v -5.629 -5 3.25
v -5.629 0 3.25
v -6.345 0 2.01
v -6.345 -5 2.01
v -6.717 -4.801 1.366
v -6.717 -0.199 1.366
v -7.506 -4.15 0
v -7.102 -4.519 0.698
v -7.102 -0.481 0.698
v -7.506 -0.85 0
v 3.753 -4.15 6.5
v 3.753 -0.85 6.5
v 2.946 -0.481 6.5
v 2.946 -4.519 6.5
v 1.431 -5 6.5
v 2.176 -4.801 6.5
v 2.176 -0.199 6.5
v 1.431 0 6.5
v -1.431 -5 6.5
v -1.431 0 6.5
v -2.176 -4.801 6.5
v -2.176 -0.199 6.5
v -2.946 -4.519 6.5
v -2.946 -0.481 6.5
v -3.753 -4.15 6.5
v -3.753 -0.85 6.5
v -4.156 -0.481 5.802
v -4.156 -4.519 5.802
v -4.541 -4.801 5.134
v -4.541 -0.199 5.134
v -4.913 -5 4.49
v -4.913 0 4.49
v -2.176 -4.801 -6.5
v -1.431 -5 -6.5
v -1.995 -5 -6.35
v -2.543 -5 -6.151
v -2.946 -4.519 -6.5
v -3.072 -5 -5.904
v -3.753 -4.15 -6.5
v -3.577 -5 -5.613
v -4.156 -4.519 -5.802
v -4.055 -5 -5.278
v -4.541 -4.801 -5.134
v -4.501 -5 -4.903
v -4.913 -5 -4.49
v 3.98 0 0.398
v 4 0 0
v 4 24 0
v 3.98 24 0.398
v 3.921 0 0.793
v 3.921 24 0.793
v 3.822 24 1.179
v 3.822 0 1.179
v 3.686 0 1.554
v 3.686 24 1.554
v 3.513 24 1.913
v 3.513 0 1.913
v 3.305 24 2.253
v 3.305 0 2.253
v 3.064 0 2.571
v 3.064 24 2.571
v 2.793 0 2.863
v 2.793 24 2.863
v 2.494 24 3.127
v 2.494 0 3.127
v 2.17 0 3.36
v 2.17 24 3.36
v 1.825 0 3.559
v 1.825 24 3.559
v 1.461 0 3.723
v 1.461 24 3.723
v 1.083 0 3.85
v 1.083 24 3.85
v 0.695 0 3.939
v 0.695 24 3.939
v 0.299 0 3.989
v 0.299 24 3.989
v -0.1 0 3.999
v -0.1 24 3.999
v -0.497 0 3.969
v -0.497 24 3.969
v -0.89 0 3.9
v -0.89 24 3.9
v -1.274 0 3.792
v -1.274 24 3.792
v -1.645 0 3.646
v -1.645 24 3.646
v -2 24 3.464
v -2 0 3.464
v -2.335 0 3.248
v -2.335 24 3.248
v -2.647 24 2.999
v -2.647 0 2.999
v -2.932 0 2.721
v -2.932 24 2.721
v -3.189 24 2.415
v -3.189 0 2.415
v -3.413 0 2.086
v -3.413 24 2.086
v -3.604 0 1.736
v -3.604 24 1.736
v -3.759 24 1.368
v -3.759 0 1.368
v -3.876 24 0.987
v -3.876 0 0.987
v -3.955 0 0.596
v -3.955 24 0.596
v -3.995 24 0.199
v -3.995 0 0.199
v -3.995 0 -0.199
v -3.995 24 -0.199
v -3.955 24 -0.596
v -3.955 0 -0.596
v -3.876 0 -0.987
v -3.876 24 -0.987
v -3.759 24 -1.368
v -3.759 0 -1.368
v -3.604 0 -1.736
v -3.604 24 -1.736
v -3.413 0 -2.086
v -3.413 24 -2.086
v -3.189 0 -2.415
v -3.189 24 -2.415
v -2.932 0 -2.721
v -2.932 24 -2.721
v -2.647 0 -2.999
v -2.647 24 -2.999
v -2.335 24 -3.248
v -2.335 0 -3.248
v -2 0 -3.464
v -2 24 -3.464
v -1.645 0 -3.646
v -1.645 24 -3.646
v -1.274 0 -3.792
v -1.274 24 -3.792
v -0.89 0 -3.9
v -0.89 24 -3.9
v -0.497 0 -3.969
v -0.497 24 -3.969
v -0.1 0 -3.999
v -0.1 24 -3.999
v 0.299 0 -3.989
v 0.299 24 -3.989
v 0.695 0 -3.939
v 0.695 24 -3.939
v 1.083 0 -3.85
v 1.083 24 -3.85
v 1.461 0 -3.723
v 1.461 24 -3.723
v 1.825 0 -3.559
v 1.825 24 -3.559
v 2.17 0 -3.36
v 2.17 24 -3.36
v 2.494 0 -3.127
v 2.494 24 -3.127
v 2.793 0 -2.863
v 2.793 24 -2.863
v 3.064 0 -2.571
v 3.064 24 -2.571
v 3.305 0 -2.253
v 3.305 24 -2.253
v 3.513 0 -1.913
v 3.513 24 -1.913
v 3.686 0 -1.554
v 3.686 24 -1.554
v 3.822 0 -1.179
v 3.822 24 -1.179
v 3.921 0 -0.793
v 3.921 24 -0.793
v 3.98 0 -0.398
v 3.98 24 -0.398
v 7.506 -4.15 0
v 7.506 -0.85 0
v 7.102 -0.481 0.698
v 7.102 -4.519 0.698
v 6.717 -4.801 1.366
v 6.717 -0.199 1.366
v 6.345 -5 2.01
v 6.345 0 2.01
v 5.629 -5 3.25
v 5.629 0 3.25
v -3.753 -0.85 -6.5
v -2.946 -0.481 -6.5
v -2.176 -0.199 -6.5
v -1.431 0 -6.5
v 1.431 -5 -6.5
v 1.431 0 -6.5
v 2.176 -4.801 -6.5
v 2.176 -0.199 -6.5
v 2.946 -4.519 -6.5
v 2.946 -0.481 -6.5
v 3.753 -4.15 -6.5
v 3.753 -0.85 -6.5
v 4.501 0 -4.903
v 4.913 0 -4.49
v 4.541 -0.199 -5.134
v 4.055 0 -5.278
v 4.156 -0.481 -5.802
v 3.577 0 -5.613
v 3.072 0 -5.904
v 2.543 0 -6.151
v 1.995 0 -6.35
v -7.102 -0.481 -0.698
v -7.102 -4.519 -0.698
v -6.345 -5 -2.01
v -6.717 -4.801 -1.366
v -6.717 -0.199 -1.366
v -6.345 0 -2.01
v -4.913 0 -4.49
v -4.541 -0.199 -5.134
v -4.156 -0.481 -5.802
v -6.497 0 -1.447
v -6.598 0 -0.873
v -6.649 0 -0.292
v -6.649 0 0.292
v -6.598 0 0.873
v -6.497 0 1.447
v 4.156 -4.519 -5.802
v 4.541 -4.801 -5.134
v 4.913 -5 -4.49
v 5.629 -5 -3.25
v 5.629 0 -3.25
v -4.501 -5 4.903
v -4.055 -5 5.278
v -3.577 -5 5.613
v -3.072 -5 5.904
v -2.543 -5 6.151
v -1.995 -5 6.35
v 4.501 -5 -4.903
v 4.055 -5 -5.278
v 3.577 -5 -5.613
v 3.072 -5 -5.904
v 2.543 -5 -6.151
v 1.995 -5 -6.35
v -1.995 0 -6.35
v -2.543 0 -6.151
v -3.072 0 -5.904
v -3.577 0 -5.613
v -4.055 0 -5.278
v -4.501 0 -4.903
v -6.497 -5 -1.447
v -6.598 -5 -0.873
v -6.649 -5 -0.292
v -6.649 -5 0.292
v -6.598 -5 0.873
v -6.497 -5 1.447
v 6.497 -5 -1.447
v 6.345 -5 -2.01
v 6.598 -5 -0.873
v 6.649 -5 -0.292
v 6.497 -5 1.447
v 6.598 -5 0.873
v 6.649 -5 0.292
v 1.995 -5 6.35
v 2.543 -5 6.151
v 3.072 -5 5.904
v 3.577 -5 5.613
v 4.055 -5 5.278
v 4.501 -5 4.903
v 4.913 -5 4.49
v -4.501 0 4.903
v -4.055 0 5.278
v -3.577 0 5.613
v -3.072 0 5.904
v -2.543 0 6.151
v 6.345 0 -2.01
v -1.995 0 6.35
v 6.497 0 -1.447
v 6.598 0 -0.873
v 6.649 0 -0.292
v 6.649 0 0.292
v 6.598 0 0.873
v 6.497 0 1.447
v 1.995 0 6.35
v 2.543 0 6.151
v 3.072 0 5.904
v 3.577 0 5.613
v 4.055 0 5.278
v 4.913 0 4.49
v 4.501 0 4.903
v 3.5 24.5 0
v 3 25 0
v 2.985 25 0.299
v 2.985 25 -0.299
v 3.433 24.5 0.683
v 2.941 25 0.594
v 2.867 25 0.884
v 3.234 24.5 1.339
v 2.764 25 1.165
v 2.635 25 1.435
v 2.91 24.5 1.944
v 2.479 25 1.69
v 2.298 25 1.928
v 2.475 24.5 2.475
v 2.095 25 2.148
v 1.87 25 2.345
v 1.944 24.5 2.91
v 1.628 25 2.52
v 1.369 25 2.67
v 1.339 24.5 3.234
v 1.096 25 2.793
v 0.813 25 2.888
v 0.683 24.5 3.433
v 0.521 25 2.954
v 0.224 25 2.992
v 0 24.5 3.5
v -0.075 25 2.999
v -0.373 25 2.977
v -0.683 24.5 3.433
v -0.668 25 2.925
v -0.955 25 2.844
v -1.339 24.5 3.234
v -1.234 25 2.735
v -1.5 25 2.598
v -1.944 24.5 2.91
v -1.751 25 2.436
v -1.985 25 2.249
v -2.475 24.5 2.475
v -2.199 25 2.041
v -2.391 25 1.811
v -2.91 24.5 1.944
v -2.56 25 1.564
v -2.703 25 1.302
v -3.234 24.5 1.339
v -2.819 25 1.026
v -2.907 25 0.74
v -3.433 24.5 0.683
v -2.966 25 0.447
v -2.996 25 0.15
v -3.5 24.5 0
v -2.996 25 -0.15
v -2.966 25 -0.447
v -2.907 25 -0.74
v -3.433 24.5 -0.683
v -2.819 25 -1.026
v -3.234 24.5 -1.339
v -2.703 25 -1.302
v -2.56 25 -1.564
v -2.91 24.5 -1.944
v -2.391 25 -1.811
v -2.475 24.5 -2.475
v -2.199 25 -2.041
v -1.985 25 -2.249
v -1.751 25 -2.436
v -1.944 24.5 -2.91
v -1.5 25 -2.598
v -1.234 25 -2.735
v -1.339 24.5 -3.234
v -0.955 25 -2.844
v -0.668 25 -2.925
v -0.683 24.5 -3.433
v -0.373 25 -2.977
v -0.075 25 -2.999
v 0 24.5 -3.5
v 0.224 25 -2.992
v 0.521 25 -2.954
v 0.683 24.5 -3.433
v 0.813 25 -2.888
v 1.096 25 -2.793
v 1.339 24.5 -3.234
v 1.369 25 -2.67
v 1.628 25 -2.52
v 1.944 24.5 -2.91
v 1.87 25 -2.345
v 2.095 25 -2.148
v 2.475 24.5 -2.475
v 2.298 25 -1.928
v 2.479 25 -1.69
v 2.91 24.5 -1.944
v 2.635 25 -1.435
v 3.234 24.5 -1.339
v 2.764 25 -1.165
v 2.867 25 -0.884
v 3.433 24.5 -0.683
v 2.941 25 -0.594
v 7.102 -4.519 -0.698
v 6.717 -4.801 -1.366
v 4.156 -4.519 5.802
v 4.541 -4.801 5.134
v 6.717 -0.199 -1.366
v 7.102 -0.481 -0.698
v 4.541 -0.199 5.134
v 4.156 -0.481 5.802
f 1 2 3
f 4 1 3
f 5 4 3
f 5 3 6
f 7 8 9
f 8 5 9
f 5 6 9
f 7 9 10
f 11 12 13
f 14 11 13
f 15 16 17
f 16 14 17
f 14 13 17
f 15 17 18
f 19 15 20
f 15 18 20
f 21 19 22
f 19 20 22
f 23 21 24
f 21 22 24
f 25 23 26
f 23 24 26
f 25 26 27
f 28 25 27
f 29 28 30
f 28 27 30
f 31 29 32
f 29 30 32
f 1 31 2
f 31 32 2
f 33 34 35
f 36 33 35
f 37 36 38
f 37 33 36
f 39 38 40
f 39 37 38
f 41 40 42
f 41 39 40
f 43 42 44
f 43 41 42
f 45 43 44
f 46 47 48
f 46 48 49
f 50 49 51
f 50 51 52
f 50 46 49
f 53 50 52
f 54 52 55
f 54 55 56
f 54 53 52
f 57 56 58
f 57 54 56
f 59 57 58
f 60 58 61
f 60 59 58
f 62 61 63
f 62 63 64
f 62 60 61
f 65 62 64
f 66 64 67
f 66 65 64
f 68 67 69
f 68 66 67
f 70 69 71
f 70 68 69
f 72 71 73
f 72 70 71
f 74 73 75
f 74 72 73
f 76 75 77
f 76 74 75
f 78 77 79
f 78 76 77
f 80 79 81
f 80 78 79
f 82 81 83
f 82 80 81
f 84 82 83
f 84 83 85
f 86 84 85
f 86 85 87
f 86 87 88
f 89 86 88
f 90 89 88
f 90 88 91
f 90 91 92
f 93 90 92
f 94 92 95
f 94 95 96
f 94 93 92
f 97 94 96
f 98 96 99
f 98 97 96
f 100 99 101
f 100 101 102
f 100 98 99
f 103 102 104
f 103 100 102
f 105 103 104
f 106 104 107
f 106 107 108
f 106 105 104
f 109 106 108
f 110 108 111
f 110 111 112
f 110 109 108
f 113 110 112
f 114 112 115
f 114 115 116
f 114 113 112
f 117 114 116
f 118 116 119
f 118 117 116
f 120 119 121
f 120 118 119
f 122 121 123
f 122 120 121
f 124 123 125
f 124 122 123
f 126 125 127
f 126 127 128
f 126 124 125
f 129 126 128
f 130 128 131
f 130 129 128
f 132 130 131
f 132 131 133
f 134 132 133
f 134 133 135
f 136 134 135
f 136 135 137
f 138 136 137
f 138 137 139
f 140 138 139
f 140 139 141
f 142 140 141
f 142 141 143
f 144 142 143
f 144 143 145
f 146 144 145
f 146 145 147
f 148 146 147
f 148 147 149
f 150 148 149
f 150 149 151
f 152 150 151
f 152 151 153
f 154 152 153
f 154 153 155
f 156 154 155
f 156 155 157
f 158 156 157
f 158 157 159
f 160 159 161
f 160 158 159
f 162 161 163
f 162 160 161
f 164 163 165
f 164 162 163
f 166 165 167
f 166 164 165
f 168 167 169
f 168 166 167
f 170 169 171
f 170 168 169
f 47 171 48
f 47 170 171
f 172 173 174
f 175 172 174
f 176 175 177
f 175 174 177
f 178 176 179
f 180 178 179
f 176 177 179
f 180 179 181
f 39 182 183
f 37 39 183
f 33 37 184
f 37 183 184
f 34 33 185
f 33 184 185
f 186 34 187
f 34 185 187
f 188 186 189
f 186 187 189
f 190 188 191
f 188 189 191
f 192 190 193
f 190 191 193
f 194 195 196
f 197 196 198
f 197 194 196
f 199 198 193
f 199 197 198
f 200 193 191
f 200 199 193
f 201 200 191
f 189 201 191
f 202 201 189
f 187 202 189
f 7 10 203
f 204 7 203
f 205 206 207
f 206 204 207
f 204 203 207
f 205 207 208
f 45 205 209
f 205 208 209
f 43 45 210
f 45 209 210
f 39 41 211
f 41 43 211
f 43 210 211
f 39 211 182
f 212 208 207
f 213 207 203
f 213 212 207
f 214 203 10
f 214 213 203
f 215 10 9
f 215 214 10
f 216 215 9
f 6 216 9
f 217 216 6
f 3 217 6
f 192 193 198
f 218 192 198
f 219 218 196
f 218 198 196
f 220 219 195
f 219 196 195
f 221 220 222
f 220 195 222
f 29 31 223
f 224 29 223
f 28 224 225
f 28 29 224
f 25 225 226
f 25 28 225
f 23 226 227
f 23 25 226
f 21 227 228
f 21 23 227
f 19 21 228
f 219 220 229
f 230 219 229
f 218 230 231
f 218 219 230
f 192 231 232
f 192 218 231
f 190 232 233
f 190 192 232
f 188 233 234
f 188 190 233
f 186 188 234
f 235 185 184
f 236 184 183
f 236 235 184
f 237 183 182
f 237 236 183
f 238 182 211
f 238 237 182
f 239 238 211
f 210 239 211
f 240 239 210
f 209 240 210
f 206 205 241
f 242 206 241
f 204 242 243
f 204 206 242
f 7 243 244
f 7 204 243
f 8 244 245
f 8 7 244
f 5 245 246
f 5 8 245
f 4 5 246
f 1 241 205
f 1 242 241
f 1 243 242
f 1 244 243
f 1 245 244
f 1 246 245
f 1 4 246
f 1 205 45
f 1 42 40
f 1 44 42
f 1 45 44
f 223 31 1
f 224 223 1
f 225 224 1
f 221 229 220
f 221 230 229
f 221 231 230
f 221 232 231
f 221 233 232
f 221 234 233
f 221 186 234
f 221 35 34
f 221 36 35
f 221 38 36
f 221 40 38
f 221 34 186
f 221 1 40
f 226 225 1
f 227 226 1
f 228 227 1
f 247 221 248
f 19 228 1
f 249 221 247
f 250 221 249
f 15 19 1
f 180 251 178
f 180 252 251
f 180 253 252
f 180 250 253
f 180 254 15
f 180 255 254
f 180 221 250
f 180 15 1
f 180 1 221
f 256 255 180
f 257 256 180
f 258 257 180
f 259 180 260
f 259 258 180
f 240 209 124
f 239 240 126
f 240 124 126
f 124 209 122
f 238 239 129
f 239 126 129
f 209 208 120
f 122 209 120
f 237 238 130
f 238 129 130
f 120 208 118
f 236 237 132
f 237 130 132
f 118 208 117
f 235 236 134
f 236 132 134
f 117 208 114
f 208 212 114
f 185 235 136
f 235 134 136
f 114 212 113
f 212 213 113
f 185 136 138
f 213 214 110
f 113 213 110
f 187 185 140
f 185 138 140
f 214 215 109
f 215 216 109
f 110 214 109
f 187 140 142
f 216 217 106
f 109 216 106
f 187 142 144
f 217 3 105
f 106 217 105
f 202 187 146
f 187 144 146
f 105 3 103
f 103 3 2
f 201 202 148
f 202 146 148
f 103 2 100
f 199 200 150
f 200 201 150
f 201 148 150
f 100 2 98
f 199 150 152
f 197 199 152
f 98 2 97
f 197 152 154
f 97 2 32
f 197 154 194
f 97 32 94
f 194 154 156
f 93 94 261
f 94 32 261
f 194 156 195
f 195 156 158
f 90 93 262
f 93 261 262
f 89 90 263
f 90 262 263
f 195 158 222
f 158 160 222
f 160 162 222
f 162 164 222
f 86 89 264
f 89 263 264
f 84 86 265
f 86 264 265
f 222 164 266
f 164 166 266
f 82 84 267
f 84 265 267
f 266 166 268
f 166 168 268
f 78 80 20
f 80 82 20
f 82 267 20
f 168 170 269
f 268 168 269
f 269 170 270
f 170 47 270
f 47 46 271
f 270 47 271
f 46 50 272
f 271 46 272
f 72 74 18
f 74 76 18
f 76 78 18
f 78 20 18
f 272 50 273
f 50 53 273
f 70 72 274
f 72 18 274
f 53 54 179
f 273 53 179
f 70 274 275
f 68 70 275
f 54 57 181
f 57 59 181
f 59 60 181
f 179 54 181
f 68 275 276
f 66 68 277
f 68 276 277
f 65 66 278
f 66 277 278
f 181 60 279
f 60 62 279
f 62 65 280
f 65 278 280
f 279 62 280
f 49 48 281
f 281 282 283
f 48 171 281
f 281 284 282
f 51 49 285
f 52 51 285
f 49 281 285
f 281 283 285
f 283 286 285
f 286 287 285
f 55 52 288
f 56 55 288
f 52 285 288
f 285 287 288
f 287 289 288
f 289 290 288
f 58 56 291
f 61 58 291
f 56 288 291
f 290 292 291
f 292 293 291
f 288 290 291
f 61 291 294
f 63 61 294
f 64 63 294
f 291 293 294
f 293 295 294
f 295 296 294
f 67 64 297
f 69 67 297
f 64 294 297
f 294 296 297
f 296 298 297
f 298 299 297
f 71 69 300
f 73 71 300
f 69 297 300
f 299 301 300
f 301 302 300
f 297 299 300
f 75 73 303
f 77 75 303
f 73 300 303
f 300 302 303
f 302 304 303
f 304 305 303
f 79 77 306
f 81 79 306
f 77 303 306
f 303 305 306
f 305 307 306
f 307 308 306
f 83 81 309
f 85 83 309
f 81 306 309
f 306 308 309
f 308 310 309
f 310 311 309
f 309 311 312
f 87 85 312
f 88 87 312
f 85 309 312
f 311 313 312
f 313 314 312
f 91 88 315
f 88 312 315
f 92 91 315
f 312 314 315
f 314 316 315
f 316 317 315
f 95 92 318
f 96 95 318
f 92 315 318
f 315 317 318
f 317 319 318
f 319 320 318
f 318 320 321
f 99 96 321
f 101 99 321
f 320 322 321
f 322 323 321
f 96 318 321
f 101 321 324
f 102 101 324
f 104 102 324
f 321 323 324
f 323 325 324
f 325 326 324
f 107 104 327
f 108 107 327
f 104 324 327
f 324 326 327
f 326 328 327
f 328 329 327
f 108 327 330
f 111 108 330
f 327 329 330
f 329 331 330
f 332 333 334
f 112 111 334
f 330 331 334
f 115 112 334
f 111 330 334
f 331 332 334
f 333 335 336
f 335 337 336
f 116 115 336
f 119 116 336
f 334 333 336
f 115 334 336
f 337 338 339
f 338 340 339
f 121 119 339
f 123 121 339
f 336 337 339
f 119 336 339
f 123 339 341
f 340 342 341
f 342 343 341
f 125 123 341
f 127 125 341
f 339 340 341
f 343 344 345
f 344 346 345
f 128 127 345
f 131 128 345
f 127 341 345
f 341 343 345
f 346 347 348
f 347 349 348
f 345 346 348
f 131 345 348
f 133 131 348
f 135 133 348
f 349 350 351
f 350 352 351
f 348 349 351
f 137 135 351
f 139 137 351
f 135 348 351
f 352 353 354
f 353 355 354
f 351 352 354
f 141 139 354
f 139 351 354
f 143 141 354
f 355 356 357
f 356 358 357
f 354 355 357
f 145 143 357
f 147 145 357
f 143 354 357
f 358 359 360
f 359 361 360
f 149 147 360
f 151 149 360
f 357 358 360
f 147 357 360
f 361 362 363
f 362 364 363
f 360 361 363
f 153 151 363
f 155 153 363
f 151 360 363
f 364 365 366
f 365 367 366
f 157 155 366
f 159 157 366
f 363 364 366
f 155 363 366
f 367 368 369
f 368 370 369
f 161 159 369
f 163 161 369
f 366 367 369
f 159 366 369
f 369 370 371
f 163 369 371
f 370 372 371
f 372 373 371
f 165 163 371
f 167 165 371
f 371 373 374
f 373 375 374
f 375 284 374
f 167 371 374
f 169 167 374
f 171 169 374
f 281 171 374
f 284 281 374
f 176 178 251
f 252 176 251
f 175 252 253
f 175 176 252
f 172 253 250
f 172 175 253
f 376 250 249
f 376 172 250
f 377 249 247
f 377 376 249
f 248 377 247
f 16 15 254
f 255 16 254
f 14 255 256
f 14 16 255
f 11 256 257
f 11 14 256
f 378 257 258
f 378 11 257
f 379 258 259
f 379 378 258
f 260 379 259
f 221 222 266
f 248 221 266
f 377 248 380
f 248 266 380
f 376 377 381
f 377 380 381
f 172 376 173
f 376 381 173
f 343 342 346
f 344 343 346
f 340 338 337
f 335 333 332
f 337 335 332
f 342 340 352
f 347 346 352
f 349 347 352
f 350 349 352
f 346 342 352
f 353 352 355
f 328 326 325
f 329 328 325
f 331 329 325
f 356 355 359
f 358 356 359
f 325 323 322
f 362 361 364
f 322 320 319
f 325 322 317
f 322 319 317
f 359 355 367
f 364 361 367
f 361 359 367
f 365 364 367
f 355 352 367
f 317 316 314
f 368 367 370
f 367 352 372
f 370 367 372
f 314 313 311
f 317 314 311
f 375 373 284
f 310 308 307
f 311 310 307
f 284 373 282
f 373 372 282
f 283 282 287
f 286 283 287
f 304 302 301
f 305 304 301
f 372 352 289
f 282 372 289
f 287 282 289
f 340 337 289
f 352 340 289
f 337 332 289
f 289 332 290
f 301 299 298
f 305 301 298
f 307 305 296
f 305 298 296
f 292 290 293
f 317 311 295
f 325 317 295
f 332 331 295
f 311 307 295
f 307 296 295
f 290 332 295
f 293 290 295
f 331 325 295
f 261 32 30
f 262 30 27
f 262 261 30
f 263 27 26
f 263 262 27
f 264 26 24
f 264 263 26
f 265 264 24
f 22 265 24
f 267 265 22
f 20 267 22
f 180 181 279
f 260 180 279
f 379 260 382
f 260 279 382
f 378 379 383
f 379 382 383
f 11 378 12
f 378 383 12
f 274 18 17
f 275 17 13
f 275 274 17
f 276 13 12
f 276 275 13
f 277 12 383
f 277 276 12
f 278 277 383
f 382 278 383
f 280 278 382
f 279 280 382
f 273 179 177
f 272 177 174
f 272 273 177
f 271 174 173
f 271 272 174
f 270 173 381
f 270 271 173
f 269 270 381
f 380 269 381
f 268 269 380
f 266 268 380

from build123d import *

# Parameters (mm, degrees)
F0_R     = 4
F1_DEPTH = 5
F2_DEPTH = 25
F3_SIZE  = 1


with BuildPart() as f1:
    # F0 (on Front) → F1 (new body)
    with BuildSketch(Plane.XZ):
        with BuildLine():
            ThreePointArc((5.6291651023, -3.2500000386), (6.2785178651, -1.6823238147), (6.5, 0))
            ThreePointArc((6.5, 0), (6.2785178797, 1.6823237603), (5.6291651586, 3.2499999411))
            ThreePointArc((5.6291651586, 3.2499999411), (3.2500000295, 5.6291651076), (0, 6.5))
            ThreePointArc((0, 6.5), (-3.2499999993, 5.629165125), (-5.6291651238, 3.2500000014))
            ThreePointArc((-5.6291651238, 3.2500000014), (-6.5, -6.45e-08), (-5.6291650593, -3.2500001131))
            ThreePointArc((-5.6291650593, -3.2500001131), (-3.2499999434, -5.6291651573), (0, -6.5))
            ThreePointArc((0, -6.5), (3.2499999807, -5.6291651357), (5.6291651023, -3.2500000386))
        make_face()
        Circle(F0_R, mode=Mode.SUBTRACT)
        Circle(F0_R)
        with BuildLine():
            ThreePointArc((5.6291651586, 3.2499999411), (6.2785178797, 1.6823237603), (6.5, 0))
            ThreePointArc((6.5, 0), (6.2785178651, -1.6823238147), (5.6291651023, -3.2500000386))
            Line((5.6291651023, -3.2500000386), (7.5055534995, 0))
            Line((7.5055534995, 0), (5.6291651586, 3.2499999411))
        make_face()
        with BuildLine():
            Line((3.7527767497, -6.5), (5.6291651023, -3.2500000386))
            ThreePointArc((5.6291651023, -3.2500000386), (3.2499999807, -5.6291651357), (0, -6.5))
            Line((0, -6.5), (3.7527767497, -6.5))
        make_face()
        with BuildLine():
            ThreePointArc((0, 6.5), (3.2500000295, 5.6291651076), (5.6291651586, 3.2499999411))
            Line((5.6291651586, 3.2499999411), (3.7527767497, 6.5))
            Line((3.7527767497, 6.5), (0, 6.5))
        make_face()
        with BuildLine():
            ThreePointArc((-5.6291651238, 3.2500000014), (-3.2499999993, 5.629165125), (0, 6.5))
            Line((0, 6.5), (-3.7527767497, 6.5))
            Line((-3.7527767497, 6.5), (-5.6291651238, 3.2500000014))
        make_face()
        with BuildLine():
            ThreePointArc((-5.6291650593, -3.2500001131), (-6.5, -6.45e-08), (-5.6291651238, 3.2500000014))
            Line((-5.6291651238, 3.2500000014), (-7.5055534995, 0))
            Line((-7.5055534995, 0), (-5.6291650593, -3.2500001131))
        make_face()
        with BuildLine():
            Line((-3.7527767497, -6.5), (0, -6.5))
            ThreePointArc((0, -6.5), (-3.2499999434, -5.6291651573), (-5.6291650593, -3.2500001131))
            Line((-5.6291650593, -3.2500001131), (-3.7527767497, -6.5))
        make_face()
    extrude(amount=F1_DEPTH)

    # F0 (on Front) → F2 (join)
    with BuildSketch(Plane.XZ):
        Circle(F0_R)
    extrude(amount=-F2_DEPTH)

    # F3
    f3_edges = [f1.edges().sort_by_distance(p)[0] for p in [
        (-4, 25, 0),
    ]]
    chamfer(f3_edges, length=F3_SIZE)

    # F4 (on Right) → F5 (revolve, cut)
    with BuildSketch(Plane.YZ):
        Polygon((-7.5355339059, 9.5203164965), (-7.5355339059, 4.1202170542), (-4, 7.6557509601), (-2.5, 7.6557509601), (-1, 7.6557509601), (2.5355339059, 4.1202170542), (2.5379077522, 9.5203164965), align=None)
    revolve(axis=Axis((0, 10, 0), (0, 1, 0)), mode=Mode.SUBTRACT)


solid = f1.part
